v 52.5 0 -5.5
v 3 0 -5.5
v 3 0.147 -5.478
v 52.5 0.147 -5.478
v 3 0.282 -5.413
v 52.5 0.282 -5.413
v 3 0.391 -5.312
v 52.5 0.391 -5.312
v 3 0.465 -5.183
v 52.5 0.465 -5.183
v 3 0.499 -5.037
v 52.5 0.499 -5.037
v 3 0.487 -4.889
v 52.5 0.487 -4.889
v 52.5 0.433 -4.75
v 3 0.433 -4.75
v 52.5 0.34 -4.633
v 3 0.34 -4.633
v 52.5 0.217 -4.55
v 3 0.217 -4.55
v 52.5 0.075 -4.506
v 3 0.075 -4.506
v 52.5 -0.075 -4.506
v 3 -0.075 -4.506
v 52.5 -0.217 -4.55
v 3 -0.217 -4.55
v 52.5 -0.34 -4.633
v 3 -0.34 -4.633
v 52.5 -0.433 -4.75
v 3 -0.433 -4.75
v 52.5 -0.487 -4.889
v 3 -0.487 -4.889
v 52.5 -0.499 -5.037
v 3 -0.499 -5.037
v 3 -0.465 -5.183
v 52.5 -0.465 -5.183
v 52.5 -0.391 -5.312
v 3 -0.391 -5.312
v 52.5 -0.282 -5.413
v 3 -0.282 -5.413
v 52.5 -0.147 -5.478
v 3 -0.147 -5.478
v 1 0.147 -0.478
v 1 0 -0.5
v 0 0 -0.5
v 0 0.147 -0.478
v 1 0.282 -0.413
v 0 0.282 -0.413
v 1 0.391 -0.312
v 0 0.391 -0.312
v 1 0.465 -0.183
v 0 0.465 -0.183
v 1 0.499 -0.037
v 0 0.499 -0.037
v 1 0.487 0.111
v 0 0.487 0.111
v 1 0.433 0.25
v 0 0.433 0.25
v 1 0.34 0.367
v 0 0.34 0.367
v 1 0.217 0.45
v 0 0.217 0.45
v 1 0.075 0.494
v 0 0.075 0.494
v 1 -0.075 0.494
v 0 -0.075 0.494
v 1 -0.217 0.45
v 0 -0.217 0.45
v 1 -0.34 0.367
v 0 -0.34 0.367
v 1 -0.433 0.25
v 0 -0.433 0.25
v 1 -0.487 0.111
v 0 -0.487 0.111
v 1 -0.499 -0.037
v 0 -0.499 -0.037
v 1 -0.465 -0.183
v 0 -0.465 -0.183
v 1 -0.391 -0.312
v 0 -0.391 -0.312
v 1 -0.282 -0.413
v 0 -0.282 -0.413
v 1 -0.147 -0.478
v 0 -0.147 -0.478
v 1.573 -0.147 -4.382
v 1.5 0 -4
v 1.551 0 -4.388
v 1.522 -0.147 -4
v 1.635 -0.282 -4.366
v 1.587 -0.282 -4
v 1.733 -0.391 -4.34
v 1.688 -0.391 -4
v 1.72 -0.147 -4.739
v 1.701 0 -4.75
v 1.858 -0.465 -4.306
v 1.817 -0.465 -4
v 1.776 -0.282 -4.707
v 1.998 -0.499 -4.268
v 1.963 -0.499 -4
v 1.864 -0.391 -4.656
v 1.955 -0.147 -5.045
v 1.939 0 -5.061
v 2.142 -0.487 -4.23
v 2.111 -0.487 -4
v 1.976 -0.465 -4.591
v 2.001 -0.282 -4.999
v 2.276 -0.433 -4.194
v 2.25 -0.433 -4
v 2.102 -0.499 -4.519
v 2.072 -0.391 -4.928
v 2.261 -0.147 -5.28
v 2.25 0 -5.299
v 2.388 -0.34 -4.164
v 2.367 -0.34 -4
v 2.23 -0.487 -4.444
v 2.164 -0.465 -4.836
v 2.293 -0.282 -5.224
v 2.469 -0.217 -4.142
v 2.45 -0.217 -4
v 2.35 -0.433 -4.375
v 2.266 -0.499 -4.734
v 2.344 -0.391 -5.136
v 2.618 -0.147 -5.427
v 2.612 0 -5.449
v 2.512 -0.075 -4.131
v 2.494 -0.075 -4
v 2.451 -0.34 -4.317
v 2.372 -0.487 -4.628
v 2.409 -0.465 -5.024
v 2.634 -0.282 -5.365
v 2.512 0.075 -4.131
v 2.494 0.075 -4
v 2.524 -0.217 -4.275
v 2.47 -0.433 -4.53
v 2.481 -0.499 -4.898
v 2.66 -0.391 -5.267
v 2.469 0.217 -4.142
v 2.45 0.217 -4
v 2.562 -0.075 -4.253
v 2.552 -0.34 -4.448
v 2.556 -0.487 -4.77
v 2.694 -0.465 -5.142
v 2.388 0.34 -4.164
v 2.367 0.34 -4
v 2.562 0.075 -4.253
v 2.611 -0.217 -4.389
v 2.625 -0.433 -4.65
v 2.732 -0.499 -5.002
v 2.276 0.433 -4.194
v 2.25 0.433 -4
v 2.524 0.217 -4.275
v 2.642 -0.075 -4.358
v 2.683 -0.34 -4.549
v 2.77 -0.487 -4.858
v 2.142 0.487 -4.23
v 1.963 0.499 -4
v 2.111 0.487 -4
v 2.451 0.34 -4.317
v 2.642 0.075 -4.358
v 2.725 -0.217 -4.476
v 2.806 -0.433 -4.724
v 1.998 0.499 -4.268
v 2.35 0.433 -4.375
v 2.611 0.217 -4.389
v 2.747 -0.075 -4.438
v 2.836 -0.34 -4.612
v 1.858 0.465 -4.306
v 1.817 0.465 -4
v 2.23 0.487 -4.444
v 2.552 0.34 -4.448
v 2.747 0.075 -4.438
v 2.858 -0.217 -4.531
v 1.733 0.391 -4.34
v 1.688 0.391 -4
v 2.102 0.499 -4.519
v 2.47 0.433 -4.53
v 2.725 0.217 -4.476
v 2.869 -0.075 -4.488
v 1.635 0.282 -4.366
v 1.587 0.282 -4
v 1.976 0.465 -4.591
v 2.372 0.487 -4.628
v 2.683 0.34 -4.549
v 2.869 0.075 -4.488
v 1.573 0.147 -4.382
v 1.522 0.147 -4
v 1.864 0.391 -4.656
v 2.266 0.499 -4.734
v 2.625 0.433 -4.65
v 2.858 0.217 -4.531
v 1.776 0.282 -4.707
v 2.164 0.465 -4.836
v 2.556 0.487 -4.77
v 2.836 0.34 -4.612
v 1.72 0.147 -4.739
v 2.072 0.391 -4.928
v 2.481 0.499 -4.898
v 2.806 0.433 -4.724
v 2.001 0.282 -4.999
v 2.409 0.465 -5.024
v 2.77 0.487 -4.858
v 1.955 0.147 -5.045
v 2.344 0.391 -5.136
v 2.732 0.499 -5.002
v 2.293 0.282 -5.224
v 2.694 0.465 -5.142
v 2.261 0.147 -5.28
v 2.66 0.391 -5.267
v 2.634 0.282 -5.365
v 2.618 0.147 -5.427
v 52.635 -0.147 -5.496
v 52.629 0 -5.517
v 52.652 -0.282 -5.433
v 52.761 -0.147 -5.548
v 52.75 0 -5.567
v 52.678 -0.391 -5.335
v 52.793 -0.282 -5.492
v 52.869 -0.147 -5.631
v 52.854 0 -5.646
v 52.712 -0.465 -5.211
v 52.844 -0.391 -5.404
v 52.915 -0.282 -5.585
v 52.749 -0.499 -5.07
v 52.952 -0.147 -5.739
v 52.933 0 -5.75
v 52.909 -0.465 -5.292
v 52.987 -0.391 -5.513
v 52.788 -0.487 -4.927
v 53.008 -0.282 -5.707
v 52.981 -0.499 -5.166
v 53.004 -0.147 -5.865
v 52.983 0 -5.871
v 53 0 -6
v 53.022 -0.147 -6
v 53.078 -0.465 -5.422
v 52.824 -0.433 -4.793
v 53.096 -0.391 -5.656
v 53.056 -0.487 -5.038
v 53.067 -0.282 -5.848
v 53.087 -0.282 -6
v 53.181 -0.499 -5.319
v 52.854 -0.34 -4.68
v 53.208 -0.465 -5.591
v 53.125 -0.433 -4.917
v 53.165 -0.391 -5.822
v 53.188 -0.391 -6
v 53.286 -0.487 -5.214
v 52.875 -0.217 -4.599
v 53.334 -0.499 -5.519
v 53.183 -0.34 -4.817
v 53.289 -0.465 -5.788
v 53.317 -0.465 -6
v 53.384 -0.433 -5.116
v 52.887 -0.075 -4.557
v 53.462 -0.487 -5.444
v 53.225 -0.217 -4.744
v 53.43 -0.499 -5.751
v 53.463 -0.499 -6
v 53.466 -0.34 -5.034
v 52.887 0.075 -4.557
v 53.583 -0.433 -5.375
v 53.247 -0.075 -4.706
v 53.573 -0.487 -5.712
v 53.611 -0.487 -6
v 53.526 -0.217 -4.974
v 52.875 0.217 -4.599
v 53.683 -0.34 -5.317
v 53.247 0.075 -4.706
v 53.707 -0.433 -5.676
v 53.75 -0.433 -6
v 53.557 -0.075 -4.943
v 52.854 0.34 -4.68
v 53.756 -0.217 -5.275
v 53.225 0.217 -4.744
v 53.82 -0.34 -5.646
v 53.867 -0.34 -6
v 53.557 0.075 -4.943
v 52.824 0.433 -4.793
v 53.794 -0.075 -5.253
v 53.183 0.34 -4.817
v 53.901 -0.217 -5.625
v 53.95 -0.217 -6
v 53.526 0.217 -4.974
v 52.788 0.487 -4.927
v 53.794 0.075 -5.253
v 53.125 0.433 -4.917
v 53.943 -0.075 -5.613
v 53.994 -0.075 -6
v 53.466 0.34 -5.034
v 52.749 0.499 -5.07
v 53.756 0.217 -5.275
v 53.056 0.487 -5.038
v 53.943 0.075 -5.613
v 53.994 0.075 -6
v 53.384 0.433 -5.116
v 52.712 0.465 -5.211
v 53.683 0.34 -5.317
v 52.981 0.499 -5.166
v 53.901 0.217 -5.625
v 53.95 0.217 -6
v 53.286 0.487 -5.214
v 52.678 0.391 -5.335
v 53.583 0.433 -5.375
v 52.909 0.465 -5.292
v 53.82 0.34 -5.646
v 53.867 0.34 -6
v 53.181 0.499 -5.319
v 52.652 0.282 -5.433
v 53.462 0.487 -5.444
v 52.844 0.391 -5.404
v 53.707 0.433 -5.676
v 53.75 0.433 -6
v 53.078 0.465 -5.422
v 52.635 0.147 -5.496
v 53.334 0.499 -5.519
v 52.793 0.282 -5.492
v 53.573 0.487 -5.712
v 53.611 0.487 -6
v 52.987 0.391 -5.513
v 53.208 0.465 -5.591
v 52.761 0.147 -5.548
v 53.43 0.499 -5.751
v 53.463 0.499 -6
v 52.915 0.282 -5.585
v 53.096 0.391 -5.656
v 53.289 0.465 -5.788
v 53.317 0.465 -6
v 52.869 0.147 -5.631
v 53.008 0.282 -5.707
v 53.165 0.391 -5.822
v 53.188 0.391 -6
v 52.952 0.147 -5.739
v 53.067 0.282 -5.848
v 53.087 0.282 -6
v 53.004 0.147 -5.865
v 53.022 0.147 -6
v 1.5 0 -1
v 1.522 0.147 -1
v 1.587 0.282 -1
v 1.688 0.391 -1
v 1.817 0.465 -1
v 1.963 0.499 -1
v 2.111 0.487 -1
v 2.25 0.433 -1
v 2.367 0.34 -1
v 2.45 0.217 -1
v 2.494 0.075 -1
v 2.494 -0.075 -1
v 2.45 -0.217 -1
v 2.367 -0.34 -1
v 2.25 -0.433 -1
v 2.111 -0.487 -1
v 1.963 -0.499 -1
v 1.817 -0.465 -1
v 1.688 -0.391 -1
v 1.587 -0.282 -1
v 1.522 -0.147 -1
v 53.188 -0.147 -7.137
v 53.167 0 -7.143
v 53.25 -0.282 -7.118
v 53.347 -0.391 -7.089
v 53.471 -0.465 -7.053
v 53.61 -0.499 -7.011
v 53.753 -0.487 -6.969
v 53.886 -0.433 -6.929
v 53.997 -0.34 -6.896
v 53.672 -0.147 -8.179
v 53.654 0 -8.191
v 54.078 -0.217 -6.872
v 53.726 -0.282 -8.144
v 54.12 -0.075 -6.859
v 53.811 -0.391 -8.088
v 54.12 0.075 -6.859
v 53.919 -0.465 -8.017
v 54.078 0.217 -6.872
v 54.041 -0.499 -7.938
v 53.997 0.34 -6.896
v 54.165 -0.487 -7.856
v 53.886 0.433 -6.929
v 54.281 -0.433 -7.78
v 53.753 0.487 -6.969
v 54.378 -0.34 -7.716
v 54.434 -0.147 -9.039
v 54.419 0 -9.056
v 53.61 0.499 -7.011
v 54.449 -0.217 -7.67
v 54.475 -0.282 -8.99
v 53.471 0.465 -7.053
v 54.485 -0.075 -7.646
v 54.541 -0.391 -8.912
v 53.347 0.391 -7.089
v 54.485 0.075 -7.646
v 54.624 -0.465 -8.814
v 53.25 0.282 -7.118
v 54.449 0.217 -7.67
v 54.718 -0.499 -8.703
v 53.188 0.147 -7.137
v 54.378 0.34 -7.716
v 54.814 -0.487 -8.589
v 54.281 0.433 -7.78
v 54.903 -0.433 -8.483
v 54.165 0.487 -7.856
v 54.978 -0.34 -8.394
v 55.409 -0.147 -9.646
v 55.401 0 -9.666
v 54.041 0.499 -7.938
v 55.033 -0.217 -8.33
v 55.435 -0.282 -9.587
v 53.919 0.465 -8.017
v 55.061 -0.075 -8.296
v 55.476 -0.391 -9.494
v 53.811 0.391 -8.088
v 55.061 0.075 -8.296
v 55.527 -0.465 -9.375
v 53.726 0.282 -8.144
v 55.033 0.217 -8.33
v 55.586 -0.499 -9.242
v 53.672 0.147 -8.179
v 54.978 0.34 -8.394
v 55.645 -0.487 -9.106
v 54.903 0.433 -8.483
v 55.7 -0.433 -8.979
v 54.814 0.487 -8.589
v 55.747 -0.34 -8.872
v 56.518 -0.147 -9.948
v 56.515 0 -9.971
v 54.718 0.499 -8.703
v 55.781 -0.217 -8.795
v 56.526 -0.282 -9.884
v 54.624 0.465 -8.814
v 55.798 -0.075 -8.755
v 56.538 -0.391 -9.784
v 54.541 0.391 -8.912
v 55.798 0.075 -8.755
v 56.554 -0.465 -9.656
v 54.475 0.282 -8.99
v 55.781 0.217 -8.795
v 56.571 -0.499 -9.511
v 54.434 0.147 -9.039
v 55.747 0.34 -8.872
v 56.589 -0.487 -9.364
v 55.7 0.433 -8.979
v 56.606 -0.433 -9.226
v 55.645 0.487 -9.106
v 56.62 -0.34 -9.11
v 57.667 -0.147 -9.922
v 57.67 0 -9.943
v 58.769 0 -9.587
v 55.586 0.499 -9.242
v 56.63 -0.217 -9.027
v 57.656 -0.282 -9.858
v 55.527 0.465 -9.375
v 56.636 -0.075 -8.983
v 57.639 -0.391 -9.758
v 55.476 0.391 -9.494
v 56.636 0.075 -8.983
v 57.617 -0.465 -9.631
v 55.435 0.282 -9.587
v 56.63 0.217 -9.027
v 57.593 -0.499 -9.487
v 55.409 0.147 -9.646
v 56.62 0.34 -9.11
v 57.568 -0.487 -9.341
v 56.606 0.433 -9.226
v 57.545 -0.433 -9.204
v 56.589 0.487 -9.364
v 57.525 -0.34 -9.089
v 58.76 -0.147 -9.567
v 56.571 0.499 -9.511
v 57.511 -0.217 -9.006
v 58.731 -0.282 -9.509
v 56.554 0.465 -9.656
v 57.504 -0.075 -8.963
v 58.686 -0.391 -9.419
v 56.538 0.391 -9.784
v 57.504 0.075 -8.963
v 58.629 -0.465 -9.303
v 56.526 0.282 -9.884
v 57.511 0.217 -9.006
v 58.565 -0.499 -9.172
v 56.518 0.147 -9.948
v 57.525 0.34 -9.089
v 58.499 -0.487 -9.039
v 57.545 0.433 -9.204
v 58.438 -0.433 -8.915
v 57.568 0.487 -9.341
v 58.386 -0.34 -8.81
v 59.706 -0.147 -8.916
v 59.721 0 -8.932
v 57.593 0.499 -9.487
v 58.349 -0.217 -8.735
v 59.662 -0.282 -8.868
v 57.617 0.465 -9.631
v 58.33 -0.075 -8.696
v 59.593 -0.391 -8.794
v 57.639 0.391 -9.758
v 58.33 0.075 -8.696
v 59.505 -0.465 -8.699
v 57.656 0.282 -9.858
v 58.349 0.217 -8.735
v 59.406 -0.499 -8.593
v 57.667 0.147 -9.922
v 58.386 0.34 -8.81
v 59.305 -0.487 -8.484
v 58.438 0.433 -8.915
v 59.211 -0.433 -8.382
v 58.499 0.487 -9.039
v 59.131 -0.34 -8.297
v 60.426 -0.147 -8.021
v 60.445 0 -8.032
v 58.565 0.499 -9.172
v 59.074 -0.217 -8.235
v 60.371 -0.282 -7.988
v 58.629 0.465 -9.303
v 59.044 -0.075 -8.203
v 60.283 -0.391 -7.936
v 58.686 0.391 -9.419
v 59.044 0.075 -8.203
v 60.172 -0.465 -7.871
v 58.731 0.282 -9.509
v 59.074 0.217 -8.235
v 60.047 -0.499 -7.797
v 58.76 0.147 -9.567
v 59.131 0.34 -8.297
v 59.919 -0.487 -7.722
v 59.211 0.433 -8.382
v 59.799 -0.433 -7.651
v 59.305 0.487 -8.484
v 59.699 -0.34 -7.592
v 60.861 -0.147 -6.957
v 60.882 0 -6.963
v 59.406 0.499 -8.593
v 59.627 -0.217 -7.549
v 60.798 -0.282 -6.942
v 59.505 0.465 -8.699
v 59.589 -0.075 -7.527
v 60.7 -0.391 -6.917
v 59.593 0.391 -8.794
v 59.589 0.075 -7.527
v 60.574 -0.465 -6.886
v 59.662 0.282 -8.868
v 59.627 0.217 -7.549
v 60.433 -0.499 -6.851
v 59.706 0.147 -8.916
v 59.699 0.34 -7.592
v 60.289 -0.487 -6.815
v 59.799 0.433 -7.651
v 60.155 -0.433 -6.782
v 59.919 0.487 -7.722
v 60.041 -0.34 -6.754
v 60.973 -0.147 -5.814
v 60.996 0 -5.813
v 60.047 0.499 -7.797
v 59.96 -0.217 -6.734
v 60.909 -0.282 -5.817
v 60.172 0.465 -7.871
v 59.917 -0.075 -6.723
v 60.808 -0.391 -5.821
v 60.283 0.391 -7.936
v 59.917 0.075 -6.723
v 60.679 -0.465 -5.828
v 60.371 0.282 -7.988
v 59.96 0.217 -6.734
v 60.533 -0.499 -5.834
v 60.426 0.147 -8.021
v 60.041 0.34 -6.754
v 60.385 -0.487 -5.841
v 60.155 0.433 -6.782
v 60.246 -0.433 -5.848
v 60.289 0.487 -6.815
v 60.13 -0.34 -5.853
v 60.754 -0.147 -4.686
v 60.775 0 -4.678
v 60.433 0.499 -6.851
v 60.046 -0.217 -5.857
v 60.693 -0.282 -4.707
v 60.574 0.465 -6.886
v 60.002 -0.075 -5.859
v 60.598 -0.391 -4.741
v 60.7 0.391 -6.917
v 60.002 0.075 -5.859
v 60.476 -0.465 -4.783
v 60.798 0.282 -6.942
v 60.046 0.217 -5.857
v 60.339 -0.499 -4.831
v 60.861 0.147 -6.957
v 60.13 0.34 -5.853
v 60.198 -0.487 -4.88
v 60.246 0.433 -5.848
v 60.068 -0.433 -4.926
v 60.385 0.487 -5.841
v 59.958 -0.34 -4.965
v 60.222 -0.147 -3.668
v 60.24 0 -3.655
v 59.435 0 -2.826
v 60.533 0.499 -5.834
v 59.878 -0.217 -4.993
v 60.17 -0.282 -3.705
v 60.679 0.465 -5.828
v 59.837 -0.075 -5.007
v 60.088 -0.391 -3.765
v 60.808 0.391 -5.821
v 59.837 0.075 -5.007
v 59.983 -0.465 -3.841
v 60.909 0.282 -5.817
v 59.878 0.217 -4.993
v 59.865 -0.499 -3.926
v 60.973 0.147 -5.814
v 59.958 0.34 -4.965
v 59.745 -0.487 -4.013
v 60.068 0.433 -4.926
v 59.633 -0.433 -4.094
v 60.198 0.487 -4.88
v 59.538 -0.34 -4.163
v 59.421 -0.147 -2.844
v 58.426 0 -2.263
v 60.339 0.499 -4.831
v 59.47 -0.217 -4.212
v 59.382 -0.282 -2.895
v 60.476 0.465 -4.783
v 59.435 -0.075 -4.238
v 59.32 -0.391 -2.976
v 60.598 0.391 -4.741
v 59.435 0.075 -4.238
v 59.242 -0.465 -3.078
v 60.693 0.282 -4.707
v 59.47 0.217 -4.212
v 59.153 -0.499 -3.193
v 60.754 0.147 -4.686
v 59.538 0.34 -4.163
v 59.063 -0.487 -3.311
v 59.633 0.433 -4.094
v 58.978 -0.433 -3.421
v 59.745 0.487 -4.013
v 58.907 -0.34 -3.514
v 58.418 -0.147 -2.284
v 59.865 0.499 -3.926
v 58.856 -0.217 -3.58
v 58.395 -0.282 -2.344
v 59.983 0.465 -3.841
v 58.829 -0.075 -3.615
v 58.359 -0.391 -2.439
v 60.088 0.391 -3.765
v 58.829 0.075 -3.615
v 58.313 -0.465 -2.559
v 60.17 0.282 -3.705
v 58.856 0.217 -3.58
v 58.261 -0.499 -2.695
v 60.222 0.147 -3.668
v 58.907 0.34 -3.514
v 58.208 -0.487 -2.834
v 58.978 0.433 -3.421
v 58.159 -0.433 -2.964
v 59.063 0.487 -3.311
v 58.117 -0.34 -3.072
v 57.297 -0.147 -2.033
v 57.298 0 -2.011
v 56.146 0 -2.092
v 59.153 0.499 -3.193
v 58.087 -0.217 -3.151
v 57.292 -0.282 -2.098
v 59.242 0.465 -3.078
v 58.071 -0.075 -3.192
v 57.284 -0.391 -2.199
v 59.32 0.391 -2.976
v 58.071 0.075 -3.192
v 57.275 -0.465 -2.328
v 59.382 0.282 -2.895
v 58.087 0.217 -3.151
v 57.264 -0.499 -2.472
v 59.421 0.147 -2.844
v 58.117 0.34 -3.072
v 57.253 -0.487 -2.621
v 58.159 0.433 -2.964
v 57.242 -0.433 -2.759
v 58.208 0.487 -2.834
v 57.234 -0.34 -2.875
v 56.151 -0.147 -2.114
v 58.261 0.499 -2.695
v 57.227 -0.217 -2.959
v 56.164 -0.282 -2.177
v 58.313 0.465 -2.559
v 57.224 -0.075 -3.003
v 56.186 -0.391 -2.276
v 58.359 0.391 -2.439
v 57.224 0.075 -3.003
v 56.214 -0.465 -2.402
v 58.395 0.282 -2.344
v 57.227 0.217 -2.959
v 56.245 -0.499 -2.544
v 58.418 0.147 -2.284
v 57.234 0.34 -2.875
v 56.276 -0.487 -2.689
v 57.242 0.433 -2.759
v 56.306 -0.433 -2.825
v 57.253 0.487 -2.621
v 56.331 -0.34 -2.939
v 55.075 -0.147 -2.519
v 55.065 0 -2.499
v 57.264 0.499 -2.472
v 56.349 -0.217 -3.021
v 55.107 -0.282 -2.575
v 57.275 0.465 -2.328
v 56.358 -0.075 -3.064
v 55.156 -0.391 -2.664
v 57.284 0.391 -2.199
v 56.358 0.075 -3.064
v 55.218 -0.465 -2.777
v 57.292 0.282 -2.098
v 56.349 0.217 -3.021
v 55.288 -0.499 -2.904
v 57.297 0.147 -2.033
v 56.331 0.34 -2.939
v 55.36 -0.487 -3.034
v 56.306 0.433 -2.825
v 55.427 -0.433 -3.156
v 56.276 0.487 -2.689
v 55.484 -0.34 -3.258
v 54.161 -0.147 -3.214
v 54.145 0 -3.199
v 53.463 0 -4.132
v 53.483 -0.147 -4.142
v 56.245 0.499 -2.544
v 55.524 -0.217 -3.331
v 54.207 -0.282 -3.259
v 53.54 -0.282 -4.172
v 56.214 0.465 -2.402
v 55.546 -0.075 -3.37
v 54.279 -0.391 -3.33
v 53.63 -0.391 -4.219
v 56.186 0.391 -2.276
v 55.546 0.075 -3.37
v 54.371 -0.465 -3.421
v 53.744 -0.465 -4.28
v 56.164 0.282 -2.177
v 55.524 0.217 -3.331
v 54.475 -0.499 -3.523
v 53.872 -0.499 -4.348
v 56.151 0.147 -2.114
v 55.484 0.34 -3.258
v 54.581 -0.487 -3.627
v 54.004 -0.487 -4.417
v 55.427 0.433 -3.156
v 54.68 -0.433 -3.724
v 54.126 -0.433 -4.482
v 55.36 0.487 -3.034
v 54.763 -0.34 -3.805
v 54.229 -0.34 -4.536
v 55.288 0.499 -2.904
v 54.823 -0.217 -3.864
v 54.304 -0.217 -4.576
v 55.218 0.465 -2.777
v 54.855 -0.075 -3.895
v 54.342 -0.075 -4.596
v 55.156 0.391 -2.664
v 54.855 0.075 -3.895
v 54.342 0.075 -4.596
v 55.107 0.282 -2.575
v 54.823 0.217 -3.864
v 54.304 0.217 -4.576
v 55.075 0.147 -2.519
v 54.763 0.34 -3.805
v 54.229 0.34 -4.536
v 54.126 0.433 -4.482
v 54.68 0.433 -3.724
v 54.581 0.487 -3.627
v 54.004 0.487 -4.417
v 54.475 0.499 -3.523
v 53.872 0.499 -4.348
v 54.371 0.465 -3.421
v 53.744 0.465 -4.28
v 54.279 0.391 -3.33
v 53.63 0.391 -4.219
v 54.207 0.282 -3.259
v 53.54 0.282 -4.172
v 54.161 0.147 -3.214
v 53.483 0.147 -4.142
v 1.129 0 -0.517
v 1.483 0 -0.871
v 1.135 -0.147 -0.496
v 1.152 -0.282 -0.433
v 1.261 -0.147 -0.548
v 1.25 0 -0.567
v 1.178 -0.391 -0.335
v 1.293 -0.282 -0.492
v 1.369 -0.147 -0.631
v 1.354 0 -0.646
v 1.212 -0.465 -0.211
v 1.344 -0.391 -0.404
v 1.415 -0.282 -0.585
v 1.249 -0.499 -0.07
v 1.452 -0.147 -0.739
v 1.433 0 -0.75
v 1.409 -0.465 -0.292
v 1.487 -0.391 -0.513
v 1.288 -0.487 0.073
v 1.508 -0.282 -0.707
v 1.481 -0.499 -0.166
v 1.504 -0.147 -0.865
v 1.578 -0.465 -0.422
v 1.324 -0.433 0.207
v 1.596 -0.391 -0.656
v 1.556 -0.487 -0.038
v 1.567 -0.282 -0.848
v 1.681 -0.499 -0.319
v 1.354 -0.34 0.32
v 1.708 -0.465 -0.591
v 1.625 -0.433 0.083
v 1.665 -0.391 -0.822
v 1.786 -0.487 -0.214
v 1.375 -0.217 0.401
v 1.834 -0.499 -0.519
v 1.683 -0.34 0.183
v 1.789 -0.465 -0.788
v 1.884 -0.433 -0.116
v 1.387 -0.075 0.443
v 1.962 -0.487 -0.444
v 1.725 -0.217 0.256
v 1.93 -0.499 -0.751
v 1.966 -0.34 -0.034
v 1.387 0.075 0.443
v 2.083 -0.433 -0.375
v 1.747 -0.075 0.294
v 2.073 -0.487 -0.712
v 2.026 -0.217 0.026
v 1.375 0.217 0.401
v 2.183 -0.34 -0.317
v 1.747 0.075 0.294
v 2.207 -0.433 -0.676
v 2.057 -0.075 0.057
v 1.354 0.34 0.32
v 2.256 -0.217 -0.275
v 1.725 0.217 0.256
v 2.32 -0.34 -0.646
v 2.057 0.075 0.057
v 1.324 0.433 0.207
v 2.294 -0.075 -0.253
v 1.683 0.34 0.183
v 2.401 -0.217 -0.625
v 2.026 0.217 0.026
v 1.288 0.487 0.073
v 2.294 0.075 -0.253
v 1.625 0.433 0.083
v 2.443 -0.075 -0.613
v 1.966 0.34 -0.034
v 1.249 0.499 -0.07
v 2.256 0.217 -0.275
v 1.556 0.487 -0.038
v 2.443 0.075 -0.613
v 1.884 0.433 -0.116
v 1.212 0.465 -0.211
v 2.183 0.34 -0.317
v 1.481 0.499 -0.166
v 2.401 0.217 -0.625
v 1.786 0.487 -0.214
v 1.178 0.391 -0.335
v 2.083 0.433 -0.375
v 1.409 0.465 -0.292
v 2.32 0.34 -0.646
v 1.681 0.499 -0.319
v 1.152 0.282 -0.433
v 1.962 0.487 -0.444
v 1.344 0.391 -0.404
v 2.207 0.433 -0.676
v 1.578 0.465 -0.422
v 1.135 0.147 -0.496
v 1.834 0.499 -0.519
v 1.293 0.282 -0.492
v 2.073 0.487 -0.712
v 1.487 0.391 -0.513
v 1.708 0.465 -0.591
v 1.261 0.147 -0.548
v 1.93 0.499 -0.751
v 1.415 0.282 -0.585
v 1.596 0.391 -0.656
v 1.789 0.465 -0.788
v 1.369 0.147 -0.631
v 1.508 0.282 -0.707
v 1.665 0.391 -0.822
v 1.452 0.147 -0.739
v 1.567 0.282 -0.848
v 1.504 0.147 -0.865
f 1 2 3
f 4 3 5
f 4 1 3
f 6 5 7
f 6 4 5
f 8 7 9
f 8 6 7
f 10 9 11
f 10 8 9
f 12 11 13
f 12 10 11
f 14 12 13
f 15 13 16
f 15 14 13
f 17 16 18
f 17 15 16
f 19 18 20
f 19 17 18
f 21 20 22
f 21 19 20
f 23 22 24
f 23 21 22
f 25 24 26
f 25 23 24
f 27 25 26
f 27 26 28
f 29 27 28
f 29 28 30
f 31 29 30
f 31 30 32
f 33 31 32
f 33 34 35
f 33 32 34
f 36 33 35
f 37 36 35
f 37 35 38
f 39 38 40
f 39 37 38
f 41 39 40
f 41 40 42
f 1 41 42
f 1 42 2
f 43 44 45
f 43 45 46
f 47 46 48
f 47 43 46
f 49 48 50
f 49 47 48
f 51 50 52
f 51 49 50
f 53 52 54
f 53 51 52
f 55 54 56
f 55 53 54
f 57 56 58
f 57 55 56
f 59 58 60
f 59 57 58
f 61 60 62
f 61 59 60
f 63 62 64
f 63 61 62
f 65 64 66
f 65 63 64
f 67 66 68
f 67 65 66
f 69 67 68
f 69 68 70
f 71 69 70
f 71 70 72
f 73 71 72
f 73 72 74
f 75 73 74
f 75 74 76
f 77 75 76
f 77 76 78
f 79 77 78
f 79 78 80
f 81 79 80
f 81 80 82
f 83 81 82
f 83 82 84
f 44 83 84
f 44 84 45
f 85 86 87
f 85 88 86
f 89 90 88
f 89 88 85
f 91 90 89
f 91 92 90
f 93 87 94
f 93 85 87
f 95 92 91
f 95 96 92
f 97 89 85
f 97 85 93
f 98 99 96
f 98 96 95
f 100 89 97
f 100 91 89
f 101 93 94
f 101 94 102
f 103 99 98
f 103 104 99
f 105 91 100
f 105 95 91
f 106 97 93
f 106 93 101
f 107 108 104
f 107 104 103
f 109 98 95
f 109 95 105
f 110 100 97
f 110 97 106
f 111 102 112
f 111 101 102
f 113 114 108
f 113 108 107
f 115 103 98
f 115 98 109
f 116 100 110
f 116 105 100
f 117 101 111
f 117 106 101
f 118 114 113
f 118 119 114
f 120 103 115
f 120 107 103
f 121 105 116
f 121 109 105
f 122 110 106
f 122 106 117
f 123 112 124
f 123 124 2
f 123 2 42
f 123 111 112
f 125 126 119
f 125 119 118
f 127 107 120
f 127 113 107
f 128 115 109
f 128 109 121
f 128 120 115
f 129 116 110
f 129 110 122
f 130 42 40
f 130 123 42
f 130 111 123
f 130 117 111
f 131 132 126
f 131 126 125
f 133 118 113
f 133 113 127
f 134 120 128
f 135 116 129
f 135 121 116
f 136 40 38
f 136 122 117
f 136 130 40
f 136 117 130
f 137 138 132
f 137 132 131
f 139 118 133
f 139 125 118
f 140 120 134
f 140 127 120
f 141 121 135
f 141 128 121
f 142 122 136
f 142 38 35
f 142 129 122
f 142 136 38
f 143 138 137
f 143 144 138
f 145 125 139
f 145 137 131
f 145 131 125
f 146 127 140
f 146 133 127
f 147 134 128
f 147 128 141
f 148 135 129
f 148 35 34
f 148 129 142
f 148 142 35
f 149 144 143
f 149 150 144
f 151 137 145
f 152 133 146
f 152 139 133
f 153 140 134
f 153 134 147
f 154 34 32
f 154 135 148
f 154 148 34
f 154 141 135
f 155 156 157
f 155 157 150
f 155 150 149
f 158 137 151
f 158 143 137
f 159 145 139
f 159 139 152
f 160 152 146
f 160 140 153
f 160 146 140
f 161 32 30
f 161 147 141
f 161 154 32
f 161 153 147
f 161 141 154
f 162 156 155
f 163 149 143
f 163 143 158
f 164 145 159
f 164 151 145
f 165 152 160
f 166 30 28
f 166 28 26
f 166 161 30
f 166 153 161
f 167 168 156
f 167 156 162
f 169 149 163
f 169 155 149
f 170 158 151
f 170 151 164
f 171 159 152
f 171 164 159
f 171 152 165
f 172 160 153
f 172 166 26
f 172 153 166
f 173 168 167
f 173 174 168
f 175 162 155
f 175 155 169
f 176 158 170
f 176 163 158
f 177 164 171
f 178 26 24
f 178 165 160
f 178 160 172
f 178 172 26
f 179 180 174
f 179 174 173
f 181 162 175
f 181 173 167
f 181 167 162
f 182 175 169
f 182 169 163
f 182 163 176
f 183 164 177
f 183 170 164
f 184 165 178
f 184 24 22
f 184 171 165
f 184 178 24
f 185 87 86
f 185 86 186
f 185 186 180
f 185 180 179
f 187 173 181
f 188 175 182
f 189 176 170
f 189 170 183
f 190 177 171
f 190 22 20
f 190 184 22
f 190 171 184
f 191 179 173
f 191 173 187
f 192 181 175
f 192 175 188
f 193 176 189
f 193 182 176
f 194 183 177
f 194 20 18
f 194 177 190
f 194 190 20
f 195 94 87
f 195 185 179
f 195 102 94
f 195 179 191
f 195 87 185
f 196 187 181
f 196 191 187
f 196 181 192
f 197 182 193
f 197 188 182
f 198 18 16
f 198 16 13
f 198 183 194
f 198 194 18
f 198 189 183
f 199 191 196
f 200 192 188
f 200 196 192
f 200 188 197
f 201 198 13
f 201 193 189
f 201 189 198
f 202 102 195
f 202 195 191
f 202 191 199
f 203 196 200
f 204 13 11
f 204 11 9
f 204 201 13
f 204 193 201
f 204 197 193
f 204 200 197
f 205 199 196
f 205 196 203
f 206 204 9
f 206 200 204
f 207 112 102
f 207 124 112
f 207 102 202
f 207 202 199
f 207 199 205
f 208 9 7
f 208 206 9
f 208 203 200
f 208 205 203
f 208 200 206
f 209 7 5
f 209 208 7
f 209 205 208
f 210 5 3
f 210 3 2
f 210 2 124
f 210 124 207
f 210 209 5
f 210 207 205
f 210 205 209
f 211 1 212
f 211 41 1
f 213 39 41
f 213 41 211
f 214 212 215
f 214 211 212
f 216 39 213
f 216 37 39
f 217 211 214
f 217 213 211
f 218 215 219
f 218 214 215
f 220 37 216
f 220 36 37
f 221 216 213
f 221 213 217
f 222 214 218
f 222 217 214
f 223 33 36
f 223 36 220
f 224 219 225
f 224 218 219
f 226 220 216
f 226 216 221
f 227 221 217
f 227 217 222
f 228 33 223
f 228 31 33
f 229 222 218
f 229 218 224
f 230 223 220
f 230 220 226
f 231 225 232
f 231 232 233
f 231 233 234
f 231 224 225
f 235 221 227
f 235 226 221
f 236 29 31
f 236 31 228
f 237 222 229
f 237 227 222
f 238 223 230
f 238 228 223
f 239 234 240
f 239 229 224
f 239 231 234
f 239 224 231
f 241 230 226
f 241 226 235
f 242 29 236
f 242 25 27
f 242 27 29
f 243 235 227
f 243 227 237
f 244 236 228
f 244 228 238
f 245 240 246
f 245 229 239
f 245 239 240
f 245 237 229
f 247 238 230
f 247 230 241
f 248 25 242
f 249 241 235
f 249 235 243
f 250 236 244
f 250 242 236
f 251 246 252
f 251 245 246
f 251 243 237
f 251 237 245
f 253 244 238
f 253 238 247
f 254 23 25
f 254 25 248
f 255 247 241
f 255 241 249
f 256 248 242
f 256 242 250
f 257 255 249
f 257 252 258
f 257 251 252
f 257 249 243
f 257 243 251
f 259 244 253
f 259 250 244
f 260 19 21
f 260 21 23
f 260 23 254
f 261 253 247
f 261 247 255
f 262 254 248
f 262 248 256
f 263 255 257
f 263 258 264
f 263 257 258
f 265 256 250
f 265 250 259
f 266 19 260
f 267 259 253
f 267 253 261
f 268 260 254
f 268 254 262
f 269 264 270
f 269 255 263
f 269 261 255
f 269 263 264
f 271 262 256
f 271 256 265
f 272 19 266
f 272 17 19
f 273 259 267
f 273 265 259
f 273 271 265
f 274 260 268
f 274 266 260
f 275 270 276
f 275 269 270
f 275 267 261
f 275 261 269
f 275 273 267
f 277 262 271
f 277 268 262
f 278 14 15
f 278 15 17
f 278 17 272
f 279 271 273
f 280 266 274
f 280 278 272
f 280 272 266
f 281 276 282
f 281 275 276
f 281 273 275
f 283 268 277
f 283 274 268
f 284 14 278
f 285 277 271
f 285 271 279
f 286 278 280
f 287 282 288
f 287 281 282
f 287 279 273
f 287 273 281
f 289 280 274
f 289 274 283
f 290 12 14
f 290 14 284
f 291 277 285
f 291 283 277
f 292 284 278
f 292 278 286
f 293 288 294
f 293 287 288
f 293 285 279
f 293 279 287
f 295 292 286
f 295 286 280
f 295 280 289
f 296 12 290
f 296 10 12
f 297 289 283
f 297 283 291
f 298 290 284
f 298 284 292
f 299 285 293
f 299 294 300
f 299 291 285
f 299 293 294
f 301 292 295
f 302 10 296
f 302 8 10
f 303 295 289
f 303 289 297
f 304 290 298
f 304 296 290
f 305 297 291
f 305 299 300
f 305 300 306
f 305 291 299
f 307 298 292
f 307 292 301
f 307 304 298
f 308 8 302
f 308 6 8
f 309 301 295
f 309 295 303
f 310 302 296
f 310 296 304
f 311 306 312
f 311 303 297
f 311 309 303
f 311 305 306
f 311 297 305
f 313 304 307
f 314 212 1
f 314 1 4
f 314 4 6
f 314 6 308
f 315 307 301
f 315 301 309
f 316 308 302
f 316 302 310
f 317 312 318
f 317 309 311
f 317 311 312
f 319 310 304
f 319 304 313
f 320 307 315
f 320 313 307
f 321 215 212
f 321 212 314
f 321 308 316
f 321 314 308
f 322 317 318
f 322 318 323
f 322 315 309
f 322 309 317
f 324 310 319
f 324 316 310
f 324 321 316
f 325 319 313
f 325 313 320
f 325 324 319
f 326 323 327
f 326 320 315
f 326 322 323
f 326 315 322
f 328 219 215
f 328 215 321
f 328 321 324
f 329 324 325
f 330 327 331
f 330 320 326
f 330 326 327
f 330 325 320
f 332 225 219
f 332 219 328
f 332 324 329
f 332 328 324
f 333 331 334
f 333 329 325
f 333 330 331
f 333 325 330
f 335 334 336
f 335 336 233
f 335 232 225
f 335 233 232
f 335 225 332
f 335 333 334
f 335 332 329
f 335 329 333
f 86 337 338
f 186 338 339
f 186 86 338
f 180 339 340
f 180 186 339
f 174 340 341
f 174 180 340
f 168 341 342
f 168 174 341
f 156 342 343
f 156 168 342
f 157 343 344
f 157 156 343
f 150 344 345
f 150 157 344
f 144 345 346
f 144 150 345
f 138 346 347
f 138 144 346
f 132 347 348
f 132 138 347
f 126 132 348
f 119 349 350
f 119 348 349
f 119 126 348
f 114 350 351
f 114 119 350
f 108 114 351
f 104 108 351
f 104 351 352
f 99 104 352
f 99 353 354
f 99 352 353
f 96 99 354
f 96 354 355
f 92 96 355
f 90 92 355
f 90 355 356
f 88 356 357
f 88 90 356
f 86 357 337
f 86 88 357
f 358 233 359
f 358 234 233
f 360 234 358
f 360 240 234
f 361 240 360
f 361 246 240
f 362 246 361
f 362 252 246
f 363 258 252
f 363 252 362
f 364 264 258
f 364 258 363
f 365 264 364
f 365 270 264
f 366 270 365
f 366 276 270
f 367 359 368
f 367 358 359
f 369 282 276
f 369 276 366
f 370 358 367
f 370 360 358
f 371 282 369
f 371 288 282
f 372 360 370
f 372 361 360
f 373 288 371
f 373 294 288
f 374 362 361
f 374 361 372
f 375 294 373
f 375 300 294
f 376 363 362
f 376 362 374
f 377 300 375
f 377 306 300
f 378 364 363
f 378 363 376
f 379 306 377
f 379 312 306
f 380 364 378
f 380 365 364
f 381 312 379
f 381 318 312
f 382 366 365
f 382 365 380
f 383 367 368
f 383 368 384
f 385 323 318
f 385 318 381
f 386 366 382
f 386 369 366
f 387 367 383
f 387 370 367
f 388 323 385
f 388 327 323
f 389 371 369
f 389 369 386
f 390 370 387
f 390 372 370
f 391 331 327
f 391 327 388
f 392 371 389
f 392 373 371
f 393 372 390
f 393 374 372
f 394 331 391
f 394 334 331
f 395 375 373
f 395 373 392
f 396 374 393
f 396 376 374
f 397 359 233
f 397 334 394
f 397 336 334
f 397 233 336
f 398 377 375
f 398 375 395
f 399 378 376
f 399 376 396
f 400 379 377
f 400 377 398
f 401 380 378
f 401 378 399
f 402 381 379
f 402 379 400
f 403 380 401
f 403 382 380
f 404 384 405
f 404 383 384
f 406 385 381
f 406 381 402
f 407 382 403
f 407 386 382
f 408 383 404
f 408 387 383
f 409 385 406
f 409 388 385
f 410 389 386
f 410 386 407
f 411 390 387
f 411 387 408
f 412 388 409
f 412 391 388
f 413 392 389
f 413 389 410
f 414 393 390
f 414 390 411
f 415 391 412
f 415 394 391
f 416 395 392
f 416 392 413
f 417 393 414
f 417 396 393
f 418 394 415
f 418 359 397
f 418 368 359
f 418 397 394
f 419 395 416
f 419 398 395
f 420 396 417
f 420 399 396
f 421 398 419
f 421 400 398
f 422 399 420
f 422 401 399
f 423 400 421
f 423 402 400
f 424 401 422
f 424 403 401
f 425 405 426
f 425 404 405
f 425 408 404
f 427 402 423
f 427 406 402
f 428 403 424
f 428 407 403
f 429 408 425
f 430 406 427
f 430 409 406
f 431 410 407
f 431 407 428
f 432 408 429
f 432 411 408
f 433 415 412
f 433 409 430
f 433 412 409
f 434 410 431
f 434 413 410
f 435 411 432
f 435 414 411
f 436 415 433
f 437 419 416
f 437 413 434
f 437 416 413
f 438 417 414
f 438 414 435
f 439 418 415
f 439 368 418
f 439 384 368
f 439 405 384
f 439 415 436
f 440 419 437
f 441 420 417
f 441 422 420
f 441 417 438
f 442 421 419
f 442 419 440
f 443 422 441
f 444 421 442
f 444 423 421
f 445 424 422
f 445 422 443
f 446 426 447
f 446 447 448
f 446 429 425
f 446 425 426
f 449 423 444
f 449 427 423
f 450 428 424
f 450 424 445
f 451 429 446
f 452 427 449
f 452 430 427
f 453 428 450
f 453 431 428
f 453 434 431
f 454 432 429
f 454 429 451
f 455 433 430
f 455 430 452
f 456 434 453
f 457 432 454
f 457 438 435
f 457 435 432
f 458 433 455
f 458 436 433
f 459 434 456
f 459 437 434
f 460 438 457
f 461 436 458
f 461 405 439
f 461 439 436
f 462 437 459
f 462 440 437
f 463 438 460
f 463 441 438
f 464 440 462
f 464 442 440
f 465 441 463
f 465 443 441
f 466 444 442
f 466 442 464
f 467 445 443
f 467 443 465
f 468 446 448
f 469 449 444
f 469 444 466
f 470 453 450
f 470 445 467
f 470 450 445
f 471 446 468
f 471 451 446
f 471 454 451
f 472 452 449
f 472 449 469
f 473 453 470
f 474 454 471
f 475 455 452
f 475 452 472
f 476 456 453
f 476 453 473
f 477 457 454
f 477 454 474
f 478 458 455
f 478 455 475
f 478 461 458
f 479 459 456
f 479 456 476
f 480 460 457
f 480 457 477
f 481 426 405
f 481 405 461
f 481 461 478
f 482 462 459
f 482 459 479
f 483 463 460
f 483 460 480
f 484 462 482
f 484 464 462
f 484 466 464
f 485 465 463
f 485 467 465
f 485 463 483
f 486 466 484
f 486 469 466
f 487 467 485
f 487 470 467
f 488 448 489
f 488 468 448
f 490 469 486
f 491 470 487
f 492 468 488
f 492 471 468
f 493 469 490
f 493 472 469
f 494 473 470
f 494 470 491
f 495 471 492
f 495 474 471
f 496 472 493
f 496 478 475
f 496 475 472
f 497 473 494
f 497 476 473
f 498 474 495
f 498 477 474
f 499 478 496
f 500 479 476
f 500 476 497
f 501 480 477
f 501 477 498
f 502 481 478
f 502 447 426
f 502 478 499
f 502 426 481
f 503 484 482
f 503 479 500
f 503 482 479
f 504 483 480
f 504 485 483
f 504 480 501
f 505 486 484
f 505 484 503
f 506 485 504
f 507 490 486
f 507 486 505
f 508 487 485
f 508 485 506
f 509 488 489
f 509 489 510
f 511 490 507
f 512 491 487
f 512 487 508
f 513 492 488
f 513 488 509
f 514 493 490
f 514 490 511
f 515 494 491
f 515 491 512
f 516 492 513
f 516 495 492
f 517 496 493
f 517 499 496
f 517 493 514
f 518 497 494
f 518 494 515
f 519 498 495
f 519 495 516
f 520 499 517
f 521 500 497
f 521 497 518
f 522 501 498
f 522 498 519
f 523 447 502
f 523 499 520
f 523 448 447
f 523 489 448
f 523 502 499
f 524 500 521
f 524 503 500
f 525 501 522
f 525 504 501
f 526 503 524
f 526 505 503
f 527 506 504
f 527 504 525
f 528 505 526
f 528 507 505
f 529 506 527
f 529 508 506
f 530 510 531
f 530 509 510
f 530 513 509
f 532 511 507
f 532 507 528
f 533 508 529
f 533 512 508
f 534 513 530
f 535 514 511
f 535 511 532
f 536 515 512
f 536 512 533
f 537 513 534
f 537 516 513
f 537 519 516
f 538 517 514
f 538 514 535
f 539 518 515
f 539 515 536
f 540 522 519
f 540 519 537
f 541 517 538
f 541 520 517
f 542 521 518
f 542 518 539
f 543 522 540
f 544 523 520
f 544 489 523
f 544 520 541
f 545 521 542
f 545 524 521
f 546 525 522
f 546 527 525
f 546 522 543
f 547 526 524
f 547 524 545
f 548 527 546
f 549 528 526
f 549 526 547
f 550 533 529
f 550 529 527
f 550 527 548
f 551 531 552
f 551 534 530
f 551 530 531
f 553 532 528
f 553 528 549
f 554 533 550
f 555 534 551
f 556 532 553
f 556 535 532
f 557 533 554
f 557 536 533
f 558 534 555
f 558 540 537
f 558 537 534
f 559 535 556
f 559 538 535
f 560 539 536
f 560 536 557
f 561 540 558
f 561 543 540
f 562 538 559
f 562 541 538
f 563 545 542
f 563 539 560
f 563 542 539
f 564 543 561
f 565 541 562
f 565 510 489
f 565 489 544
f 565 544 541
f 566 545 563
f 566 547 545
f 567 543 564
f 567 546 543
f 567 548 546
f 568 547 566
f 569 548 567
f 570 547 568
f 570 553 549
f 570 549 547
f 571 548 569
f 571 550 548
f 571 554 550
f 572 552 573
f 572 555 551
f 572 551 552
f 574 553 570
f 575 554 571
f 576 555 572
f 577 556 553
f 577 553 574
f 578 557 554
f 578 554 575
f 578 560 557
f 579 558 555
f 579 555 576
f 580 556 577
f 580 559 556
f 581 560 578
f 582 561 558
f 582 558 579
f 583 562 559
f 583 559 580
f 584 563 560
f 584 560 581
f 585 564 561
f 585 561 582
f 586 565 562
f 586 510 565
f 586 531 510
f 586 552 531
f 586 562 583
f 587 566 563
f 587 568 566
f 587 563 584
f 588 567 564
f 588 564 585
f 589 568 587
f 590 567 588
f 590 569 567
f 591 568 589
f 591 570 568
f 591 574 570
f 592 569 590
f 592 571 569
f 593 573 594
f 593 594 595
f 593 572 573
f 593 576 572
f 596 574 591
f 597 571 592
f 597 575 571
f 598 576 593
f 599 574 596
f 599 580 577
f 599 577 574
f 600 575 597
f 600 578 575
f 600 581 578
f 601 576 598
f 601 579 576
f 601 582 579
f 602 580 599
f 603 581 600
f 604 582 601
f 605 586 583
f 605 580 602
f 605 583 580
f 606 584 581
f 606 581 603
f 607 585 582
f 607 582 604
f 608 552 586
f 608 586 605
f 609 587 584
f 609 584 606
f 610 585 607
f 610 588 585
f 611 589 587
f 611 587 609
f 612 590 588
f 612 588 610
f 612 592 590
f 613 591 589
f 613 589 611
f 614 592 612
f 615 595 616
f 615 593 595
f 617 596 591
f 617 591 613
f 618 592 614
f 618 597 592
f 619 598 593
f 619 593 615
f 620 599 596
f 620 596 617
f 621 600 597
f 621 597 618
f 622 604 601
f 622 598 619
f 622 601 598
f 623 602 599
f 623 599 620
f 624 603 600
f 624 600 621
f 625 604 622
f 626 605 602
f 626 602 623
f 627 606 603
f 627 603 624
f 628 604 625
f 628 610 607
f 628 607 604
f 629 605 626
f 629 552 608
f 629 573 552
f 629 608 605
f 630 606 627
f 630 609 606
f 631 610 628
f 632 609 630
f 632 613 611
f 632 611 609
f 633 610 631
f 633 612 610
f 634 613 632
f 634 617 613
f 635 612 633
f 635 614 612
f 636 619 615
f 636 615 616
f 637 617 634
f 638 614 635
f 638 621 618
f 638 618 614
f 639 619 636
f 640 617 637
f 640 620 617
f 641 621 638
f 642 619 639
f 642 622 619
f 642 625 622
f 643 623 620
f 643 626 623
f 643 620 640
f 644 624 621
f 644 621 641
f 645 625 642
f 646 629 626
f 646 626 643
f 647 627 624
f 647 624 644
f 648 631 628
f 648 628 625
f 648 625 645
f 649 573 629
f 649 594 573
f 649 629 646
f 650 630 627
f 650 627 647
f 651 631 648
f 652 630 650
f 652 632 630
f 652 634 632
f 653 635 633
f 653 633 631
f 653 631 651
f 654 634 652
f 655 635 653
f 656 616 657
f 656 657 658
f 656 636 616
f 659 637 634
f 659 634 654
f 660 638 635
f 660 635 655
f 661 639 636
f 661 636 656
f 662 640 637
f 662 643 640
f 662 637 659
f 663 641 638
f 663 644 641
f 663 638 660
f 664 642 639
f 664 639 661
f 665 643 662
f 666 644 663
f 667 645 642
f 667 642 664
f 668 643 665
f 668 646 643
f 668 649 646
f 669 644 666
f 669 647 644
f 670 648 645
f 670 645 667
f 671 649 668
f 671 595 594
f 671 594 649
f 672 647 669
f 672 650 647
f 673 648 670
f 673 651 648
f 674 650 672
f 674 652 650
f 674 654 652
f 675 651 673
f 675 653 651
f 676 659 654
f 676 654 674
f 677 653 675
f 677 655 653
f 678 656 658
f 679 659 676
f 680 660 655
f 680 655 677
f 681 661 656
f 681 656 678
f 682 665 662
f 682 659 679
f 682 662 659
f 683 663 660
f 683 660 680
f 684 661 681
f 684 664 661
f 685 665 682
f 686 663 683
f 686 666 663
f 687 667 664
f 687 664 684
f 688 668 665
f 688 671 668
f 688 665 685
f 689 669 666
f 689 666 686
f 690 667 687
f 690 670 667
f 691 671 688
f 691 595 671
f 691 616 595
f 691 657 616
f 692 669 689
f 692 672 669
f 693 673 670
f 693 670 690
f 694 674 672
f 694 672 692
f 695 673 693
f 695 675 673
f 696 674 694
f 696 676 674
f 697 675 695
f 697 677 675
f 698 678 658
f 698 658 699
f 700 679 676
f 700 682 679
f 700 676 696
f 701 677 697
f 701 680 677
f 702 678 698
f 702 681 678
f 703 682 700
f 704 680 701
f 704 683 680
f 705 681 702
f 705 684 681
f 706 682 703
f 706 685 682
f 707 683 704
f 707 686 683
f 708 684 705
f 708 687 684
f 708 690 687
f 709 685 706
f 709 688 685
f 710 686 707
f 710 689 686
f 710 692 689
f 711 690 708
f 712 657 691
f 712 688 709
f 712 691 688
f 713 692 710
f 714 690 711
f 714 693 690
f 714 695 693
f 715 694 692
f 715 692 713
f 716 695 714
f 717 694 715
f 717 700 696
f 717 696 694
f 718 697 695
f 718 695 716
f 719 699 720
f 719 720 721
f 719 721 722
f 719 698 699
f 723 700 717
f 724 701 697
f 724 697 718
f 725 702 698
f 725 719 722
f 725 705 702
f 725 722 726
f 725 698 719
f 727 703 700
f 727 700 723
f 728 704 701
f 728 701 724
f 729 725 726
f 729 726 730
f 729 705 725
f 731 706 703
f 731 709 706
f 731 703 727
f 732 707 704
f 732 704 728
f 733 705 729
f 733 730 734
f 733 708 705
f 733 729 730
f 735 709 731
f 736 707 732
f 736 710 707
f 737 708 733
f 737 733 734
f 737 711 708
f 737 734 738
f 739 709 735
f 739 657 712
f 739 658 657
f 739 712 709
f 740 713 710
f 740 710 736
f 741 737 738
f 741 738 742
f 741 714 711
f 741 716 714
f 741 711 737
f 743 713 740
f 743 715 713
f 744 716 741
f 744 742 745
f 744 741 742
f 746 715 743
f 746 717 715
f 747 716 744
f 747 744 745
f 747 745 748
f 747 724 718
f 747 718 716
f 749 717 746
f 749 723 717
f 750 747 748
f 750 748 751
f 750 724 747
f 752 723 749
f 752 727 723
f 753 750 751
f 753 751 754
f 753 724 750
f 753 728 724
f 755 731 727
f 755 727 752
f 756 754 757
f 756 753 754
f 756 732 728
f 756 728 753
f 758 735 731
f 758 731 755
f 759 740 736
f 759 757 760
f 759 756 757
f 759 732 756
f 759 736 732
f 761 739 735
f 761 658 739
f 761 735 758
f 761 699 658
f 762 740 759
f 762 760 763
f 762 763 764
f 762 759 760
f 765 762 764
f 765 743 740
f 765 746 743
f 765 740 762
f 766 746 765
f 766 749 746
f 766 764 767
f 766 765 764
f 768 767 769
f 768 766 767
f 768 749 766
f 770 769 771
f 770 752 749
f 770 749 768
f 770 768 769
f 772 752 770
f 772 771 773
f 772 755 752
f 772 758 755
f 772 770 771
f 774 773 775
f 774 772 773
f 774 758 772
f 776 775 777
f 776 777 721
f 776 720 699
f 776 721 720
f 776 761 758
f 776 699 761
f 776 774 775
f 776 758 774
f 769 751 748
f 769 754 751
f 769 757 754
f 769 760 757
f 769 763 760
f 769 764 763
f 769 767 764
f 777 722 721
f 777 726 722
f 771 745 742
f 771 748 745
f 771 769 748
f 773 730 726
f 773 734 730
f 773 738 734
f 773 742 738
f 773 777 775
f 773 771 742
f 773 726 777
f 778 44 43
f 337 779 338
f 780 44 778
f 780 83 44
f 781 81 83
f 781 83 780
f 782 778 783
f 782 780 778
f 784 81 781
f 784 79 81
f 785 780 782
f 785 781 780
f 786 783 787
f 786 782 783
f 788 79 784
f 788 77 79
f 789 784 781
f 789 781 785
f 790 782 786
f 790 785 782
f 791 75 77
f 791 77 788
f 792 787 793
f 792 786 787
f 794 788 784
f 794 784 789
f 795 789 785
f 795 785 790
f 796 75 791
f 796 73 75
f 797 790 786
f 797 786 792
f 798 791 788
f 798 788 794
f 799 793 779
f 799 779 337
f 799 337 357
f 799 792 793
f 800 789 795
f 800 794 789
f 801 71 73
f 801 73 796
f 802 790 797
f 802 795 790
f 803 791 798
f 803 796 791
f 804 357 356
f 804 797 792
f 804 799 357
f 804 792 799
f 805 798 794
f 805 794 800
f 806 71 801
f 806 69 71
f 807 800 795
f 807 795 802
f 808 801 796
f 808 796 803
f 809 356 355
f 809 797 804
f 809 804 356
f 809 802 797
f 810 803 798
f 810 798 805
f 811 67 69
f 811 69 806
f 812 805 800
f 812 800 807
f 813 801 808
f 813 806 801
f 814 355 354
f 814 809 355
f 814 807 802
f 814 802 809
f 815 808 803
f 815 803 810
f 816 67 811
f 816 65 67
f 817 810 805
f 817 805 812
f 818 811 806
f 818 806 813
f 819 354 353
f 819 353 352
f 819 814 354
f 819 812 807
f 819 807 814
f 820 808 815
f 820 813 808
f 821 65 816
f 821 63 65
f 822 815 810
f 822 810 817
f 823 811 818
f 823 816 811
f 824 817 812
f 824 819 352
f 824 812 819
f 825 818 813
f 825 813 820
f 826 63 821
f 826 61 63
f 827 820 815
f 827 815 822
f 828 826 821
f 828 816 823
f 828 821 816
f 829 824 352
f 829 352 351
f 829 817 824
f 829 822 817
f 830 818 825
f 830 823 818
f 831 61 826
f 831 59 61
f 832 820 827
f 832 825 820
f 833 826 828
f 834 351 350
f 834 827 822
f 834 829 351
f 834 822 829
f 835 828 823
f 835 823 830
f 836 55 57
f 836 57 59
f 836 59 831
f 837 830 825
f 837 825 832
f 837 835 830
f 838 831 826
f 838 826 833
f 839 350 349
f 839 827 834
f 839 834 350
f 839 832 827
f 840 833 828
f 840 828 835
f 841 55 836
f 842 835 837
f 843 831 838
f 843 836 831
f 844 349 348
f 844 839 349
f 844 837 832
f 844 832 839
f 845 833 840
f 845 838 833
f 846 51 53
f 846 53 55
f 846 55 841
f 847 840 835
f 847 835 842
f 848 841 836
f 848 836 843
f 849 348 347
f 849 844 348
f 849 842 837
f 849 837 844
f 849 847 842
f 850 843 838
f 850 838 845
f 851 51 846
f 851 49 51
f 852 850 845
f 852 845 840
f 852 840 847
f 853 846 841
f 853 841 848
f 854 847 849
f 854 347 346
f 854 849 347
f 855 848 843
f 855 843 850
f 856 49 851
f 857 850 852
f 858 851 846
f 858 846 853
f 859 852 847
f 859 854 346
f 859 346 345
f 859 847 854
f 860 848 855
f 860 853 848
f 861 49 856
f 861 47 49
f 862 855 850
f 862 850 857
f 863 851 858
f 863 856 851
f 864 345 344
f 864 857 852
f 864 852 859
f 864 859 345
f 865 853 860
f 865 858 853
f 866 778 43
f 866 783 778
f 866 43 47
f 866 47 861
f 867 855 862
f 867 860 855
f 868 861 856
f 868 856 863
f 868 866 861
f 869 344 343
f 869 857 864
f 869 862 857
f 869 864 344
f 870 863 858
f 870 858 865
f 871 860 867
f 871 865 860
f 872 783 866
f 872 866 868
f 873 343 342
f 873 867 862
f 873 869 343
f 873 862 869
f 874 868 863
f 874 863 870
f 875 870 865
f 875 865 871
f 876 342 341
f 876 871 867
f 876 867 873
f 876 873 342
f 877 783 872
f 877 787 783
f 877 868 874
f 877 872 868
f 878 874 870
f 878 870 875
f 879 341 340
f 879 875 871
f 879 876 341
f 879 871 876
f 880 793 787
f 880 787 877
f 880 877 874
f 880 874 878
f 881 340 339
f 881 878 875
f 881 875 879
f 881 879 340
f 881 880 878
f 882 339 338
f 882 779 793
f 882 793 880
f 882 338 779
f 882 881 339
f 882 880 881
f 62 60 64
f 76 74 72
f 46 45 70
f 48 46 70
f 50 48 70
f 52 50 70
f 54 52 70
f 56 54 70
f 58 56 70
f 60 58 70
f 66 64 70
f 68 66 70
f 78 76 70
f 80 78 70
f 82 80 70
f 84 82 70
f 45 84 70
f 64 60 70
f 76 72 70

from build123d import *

# Parameters (mm, degrees)
SKETCH2_R = 0.5


with BuildPart() as part:
    # Sweep1: sweep along a path in Sketch1
    with BuildLine(Plane(origin=(0, 0, 0), x_dir=(1, 0, 0), z_dir=(0, 1, 0))) as sweep1_path:
        Line((0, 0), (1, 0))
        ThreePointArc((1, 0), (1.707106781, 0.292893219), (2, 1))
        Line((2, 1), (2, 4))
        ThreePointArc((2, 4), (2.292893219, 4.707106781), (3, 5))
        Line((3, 5), (52.5, 5))
        ThreePointArc((52.5, 5), (53.207106781, 5.292893219), (53.5, 6))
        ThreePointArc((53.5, 6), (60.397162622, 6.842191259), (53.905306352, 4.365108191))
    # Sketch2 → Sweep1 (sweep)
    with BuildSketch(Plane(origin=(0, 0, 0), x_dir=(0, 0, -1), z_dir=(1, 0, 0))):
        Circle(SKETCH2_R)
    sweep(path=sweep1_path.line)


solid = part.part
